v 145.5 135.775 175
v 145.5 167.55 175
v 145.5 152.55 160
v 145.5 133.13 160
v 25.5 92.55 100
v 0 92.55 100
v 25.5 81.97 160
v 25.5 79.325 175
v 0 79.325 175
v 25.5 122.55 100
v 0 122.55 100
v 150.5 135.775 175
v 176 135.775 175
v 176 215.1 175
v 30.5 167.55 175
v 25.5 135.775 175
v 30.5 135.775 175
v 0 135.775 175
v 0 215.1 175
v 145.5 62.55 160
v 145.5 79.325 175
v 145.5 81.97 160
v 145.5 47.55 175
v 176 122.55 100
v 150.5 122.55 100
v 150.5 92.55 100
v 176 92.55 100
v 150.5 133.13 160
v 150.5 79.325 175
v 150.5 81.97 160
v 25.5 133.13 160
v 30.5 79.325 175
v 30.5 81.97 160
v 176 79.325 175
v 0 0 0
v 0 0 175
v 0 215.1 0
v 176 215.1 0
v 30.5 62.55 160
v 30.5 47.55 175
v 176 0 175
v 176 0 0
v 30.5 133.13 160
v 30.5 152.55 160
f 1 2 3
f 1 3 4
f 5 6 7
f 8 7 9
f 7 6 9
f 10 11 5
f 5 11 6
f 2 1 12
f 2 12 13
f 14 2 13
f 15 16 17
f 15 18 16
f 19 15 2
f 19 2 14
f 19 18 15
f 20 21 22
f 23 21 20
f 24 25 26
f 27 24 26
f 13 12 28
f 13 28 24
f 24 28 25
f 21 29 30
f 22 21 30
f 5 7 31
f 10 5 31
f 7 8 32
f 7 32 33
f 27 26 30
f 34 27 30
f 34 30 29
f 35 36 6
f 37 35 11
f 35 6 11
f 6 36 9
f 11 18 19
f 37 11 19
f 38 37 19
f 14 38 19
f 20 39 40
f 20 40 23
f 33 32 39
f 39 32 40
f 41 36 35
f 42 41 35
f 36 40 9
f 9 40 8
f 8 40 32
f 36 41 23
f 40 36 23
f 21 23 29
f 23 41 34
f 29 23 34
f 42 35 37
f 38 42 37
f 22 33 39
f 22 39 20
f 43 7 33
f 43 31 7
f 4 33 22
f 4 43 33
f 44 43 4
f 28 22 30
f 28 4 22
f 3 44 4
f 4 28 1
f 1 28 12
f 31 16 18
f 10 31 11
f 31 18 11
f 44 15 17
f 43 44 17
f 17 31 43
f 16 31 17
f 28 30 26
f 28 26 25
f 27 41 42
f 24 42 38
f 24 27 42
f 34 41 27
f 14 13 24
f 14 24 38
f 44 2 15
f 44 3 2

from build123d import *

# Parameters (mm, degrees)
EXTRUDE002_DEPTH = 5
SKETCH003_W      = 125
SKETCH003_H      = 90
EXTRUDE001_DEPTH = 70
SKETCH002_W      = 125
SKETCH002_H      = 120
EXTRUDE_DEPTH    = 176


with BuildPart() as extrude002:
    # Sketch004 (on Face1 of Extrude001) → Extrude002 (new body)
    with BuildSketch(Plane(origin=(25.5, 0, 0), x_dir=(0, -1, 0), z_dir=(-1, 0, 0))):
        Polygon((-81.970381, 160), (-62.55, 160), (-47.55, 175), (-79.325476, 175), align=None)
        Polygon((-133.129619, 160), (-135.774524, 175), (-167.55, 175), (-152.55, 160), align=None)
    extrude(amount=-EXTRUDE002_DEPTH)


with BuildPart() as extrude002_mirrored:
    # Mirror: instance of Extrude002
    add(extrude002.part.mirror(Plane(origin=(88, 0, 0), x_dir=(0, -1, 0), z_dir=(1, 0, 0))))


with BuildPart() as extrude001:
    # Sketch003 → Extrude001 (new body)
    with BuildSketch(Plane.XY.offset(160)):
        with Locations((88, 107.55)):
            Rectangle(SKETCH003_W, SKETCH003_H)
    extrude(amount=-EXTRUDE001_DEPTH)


with BuildPart() as loft_body:
    # Sketch002 (on Face1 of Extrude) → Loft section 0
    with BuildSketch(Plane.XY.offset(175)):
        with Locations((88, 107.55)):
            Rectangle(SKETCH002_W, SKETCH002_H)
    # Sketch003 → Loft section 1
    with BuildSketch(Plane.XY.offset(160)):
        with Locations((88, 107.55)):
            Rectangle(SKETCH003_W, SKETCH003_H)
    loft(ruled=True)


with BuildPart() as fusion001:
    # Sketch001 → Extrude (new body)
    with BuildSketch(Plane.YZ):
        Polygon((0, 0), (215.1, 0), (215.1, 175), (135.774524, 175), (122.55, 100), (92.55, 100), (79.325476, 175), (0, 175), align=None)
    extrude(amount=EXTRUDE_DEPTH)

    # Cut: cut Loft body
    add(loft_body.part, mode=Mode.SUBTRACT)

    # Fusion: union Extrude001
    add(extrude001.part)

    # Fusion001: union Extrude002 (mirrored), Extrude002
    add(extrude002_mirrored.part)
    add(extrude002.part)


solid = fusion001.part
